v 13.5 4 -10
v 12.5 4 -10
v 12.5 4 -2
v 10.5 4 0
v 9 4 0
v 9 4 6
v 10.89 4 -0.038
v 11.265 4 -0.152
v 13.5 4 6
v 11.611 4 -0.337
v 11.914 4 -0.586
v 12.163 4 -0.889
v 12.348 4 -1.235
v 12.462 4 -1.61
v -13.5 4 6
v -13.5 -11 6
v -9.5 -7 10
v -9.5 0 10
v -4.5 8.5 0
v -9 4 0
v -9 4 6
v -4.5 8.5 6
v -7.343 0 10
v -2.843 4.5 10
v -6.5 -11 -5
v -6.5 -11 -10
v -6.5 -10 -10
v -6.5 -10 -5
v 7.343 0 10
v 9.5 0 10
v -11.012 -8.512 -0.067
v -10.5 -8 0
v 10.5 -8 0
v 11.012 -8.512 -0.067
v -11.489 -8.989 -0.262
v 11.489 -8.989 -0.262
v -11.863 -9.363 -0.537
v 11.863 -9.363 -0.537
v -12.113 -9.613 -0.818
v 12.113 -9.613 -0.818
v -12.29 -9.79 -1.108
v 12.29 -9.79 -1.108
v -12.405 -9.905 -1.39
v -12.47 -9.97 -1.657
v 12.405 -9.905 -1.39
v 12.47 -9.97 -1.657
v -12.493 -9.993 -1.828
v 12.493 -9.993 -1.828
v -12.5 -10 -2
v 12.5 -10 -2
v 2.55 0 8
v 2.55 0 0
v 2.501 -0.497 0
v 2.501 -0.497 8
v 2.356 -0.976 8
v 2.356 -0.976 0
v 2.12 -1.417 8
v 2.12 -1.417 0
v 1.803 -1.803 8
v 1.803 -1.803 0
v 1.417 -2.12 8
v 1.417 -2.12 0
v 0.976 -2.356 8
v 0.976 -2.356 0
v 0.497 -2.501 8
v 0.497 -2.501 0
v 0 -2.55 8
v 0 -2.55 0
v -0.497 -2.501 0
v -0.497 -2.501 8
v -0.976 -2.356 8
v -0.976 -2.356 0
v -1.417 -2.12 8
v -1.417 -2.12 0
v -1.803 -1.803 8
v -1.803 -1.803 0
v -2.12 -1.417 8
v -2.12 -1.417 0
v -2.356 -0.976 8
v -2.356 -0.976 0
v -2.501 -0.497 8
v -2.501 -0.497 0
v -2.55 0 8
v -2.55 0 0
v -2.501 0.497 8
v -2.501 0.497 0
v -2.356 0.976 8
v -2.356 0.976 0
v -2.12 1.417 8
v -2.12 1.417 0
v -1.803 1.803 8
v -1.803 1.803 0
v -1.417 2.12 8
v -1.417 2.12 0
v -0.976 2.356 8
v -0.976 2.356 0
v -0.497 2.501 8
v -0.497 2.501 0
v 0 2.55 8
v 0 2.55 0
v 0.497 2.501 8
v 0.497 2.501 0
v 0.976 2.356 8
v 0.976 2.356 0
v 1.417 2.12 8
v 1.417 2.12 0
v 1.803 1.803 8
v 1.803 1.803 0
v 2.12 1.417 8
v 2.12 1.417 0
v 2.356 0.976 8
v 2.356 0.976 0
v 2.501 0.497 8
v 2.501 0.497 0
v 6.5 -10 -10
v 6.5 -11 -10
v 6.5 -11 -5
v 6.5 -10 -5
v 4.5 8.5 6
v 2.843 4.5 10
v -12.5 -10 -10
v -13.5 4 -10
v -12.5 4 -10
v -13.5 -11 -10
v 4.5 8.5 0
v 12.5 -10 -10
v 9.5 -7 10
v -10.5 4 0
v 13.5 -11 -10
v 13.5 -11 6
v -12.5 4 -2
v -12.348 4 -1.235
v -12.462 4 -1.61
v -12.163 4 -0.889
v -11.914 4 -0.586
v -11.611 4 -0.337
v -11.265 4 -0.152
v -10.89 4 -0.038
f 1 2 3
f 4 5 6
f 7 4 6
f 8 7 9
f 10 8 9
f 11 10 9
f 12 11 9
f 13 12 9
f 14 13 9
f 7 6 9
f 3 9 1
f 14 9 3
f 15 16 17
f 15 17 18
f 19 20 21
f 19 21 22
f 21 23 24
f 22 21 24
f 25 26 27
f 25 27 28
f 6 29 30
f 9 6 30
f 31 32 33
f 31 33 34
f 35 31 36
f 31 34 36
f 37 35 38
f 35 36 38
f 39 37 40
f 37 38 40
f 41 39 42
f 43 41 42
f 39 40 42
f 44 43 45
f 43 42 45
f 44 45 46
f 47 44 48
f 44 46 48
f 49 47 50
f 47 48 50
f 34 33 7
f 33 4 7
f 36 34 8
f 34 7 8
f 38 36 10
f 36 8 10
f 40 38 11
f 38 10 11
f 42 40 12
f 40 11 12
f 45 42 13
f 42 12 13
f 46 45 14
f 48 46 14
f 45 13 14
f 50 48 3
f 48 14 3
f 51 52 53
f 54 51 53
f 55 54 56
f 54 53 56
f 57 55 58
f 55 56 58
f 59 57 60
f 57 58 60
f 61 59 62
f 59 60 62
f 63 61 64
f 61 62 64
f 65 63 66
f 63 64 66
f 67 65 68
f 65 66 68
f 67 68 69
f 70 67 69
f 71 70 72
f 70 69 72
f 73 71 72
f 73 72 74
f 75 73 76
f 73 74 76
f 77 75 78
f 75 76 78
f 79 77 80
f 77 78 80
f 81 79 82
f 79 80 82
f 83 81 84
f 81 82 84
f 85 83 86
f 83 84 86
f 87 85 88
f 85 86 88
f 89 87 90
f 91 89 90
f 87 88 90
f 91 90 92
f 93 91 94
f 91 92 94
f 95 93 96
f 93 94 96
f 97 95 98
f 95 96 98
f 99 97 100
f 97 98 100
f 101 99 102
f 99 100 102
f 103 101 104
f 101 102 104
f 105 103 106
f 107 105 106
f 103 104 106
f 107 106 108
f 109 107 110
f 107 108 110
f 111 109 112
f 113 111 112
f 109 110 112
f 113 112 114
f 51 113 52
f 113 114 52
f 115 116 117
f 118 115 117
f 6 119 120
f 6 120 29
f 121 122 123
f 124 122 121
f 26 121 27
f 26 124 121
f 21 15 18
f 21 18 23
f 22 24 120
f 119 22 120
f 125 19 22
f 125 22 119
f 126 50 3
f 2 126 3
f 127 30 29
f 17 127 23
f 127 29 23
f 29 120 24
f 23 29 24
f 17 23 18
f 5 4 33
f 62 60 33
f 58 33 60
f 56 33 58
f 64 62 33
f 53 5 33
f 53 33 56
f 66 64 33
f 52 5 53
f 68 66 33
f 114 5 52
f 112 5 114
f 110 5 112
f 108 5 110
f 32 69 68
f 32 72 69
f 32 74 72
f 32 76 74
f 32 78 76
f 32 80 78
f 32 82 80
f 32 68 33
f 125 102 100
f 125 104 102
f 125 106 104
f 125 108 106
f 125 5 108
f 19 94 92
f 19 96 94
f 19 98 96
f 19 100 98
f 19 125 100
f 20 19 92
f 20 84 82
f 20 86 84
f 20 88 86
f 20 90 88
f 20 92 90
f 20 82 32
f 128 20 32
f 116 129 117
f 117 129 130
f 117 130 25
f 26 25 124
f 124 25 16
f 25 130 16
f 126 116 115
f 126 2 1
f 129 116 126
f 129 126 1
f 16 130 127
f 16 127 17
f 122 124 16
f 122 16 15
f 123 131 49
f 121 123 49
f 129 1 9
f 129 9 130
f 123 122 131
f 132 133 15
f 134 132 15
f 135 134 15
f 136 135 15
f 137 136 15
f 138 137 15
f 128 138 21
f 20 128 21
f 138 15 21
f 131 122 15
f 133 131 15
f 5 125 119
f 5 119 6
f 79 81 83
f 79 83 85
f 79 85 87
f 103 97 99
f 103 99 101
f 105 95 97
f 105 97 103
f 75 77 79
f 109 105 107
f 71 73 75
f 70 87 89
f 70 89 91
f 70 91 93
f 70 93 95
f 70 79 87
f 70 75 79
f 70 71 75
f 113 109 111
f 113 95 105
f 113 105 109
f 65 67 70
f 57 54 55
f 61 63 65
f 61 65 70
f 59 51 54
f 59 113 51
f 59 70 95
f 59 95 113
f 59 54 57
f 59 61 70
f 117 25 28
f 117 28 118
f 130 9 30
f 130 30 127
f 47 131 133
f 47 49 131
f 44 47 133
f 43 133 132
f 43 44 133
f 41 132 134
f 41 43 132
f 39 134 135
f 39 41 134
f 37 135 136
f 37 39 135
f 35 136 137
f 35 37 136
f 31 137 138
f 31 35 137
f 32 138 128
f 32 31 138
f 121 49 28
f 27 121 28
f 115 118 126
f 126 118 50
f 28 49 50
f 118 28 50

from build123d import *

# Parameters (mm, degrees)
PAD_DEPTH       = 10
SKETCH001_R     = 2.55
POCKET_DEPTH    = 8
CHAMFER_SIZE    = 4
PAD001_DEPTH    = 10
SKETCH003_W     = 13
SKETCH003_H     = 6.844848
POCKET001_DEPTH = 19.501
FILLET_R        = 2


with BuildPart() as part:
    # Sketch → Pad (new body)
    with BuildSketch(Plane.XY):
        Polygon((-4.5, 8.5), (4.5, 8.5), (9, 4), (13.5, 4), (13.5, -11), (-13.5, -11), (-13.5, 4), (-9, 4), align=None)
    extrude(amount=PAD_DEPTH)

    # Sketch001 → Pocket (cut)
    with BuildSketch(Plane(origin=(0, 0, 0), x_dir=(1, 0, 0), z_dir=(0, 0, -1))):
        Circle(SKETCH001_R)
    extrude(amount=-POCKET_DEPTH, mode=Mode.SUBTRACT)

    # Chamfer
    chamfer_edges = [part.edges().sort_by_distance(p)[0] for p in [
        (0, 8.5, 10),
        (6.75, 6.25, 10),
        (11.25, 4, 10),
        (13.5, -3.5, 10),
        (0, -11, 10),
        (-13.5, -3.5, 10),
        (-11.25, 4, 10),
        (-6.75, 6.25, 10),
    ]]
    chamfer(chamfer_edges, length=CHAMFER_SIZE)

    # Sketch002 → Pad001 (new body)
    with BuildSketch(Plane(origin=(0, 0, 0), x_dir=(1, 0, 0), z_dir=(0, 0, -1))):
        Polygon((-13.5, -4), (-12.5, -4), (-12.5, 10), (12.5, 10), (12.5, -4), (13.5, -4), (13.5, 11), (-13.5, 11), align=None)
    extrude(amount=PAD001_DEPTH)

    # Sketch003 → Pocket001 (cut, through all)
    with BuildSketch(Plane.XZ.offset(11)):
        with Locations((0, -8.422424)):
            Rectangle(SKETCH003_W, SKETCH003_H)
    extrude(amount=-POCKET001_DEPTH, mode=Mode.SUBTRACT)

    # Fillet
    fillet_edges = [part.edges().sort_by_distance(p)[0] for p in [
        (12.5, -3, 0),
        (0, -10, 0),
        (-12.5, -3, 0),
    ]]
    fillet(fillet_edges, radius=FILLET_R)


solid = part.part
